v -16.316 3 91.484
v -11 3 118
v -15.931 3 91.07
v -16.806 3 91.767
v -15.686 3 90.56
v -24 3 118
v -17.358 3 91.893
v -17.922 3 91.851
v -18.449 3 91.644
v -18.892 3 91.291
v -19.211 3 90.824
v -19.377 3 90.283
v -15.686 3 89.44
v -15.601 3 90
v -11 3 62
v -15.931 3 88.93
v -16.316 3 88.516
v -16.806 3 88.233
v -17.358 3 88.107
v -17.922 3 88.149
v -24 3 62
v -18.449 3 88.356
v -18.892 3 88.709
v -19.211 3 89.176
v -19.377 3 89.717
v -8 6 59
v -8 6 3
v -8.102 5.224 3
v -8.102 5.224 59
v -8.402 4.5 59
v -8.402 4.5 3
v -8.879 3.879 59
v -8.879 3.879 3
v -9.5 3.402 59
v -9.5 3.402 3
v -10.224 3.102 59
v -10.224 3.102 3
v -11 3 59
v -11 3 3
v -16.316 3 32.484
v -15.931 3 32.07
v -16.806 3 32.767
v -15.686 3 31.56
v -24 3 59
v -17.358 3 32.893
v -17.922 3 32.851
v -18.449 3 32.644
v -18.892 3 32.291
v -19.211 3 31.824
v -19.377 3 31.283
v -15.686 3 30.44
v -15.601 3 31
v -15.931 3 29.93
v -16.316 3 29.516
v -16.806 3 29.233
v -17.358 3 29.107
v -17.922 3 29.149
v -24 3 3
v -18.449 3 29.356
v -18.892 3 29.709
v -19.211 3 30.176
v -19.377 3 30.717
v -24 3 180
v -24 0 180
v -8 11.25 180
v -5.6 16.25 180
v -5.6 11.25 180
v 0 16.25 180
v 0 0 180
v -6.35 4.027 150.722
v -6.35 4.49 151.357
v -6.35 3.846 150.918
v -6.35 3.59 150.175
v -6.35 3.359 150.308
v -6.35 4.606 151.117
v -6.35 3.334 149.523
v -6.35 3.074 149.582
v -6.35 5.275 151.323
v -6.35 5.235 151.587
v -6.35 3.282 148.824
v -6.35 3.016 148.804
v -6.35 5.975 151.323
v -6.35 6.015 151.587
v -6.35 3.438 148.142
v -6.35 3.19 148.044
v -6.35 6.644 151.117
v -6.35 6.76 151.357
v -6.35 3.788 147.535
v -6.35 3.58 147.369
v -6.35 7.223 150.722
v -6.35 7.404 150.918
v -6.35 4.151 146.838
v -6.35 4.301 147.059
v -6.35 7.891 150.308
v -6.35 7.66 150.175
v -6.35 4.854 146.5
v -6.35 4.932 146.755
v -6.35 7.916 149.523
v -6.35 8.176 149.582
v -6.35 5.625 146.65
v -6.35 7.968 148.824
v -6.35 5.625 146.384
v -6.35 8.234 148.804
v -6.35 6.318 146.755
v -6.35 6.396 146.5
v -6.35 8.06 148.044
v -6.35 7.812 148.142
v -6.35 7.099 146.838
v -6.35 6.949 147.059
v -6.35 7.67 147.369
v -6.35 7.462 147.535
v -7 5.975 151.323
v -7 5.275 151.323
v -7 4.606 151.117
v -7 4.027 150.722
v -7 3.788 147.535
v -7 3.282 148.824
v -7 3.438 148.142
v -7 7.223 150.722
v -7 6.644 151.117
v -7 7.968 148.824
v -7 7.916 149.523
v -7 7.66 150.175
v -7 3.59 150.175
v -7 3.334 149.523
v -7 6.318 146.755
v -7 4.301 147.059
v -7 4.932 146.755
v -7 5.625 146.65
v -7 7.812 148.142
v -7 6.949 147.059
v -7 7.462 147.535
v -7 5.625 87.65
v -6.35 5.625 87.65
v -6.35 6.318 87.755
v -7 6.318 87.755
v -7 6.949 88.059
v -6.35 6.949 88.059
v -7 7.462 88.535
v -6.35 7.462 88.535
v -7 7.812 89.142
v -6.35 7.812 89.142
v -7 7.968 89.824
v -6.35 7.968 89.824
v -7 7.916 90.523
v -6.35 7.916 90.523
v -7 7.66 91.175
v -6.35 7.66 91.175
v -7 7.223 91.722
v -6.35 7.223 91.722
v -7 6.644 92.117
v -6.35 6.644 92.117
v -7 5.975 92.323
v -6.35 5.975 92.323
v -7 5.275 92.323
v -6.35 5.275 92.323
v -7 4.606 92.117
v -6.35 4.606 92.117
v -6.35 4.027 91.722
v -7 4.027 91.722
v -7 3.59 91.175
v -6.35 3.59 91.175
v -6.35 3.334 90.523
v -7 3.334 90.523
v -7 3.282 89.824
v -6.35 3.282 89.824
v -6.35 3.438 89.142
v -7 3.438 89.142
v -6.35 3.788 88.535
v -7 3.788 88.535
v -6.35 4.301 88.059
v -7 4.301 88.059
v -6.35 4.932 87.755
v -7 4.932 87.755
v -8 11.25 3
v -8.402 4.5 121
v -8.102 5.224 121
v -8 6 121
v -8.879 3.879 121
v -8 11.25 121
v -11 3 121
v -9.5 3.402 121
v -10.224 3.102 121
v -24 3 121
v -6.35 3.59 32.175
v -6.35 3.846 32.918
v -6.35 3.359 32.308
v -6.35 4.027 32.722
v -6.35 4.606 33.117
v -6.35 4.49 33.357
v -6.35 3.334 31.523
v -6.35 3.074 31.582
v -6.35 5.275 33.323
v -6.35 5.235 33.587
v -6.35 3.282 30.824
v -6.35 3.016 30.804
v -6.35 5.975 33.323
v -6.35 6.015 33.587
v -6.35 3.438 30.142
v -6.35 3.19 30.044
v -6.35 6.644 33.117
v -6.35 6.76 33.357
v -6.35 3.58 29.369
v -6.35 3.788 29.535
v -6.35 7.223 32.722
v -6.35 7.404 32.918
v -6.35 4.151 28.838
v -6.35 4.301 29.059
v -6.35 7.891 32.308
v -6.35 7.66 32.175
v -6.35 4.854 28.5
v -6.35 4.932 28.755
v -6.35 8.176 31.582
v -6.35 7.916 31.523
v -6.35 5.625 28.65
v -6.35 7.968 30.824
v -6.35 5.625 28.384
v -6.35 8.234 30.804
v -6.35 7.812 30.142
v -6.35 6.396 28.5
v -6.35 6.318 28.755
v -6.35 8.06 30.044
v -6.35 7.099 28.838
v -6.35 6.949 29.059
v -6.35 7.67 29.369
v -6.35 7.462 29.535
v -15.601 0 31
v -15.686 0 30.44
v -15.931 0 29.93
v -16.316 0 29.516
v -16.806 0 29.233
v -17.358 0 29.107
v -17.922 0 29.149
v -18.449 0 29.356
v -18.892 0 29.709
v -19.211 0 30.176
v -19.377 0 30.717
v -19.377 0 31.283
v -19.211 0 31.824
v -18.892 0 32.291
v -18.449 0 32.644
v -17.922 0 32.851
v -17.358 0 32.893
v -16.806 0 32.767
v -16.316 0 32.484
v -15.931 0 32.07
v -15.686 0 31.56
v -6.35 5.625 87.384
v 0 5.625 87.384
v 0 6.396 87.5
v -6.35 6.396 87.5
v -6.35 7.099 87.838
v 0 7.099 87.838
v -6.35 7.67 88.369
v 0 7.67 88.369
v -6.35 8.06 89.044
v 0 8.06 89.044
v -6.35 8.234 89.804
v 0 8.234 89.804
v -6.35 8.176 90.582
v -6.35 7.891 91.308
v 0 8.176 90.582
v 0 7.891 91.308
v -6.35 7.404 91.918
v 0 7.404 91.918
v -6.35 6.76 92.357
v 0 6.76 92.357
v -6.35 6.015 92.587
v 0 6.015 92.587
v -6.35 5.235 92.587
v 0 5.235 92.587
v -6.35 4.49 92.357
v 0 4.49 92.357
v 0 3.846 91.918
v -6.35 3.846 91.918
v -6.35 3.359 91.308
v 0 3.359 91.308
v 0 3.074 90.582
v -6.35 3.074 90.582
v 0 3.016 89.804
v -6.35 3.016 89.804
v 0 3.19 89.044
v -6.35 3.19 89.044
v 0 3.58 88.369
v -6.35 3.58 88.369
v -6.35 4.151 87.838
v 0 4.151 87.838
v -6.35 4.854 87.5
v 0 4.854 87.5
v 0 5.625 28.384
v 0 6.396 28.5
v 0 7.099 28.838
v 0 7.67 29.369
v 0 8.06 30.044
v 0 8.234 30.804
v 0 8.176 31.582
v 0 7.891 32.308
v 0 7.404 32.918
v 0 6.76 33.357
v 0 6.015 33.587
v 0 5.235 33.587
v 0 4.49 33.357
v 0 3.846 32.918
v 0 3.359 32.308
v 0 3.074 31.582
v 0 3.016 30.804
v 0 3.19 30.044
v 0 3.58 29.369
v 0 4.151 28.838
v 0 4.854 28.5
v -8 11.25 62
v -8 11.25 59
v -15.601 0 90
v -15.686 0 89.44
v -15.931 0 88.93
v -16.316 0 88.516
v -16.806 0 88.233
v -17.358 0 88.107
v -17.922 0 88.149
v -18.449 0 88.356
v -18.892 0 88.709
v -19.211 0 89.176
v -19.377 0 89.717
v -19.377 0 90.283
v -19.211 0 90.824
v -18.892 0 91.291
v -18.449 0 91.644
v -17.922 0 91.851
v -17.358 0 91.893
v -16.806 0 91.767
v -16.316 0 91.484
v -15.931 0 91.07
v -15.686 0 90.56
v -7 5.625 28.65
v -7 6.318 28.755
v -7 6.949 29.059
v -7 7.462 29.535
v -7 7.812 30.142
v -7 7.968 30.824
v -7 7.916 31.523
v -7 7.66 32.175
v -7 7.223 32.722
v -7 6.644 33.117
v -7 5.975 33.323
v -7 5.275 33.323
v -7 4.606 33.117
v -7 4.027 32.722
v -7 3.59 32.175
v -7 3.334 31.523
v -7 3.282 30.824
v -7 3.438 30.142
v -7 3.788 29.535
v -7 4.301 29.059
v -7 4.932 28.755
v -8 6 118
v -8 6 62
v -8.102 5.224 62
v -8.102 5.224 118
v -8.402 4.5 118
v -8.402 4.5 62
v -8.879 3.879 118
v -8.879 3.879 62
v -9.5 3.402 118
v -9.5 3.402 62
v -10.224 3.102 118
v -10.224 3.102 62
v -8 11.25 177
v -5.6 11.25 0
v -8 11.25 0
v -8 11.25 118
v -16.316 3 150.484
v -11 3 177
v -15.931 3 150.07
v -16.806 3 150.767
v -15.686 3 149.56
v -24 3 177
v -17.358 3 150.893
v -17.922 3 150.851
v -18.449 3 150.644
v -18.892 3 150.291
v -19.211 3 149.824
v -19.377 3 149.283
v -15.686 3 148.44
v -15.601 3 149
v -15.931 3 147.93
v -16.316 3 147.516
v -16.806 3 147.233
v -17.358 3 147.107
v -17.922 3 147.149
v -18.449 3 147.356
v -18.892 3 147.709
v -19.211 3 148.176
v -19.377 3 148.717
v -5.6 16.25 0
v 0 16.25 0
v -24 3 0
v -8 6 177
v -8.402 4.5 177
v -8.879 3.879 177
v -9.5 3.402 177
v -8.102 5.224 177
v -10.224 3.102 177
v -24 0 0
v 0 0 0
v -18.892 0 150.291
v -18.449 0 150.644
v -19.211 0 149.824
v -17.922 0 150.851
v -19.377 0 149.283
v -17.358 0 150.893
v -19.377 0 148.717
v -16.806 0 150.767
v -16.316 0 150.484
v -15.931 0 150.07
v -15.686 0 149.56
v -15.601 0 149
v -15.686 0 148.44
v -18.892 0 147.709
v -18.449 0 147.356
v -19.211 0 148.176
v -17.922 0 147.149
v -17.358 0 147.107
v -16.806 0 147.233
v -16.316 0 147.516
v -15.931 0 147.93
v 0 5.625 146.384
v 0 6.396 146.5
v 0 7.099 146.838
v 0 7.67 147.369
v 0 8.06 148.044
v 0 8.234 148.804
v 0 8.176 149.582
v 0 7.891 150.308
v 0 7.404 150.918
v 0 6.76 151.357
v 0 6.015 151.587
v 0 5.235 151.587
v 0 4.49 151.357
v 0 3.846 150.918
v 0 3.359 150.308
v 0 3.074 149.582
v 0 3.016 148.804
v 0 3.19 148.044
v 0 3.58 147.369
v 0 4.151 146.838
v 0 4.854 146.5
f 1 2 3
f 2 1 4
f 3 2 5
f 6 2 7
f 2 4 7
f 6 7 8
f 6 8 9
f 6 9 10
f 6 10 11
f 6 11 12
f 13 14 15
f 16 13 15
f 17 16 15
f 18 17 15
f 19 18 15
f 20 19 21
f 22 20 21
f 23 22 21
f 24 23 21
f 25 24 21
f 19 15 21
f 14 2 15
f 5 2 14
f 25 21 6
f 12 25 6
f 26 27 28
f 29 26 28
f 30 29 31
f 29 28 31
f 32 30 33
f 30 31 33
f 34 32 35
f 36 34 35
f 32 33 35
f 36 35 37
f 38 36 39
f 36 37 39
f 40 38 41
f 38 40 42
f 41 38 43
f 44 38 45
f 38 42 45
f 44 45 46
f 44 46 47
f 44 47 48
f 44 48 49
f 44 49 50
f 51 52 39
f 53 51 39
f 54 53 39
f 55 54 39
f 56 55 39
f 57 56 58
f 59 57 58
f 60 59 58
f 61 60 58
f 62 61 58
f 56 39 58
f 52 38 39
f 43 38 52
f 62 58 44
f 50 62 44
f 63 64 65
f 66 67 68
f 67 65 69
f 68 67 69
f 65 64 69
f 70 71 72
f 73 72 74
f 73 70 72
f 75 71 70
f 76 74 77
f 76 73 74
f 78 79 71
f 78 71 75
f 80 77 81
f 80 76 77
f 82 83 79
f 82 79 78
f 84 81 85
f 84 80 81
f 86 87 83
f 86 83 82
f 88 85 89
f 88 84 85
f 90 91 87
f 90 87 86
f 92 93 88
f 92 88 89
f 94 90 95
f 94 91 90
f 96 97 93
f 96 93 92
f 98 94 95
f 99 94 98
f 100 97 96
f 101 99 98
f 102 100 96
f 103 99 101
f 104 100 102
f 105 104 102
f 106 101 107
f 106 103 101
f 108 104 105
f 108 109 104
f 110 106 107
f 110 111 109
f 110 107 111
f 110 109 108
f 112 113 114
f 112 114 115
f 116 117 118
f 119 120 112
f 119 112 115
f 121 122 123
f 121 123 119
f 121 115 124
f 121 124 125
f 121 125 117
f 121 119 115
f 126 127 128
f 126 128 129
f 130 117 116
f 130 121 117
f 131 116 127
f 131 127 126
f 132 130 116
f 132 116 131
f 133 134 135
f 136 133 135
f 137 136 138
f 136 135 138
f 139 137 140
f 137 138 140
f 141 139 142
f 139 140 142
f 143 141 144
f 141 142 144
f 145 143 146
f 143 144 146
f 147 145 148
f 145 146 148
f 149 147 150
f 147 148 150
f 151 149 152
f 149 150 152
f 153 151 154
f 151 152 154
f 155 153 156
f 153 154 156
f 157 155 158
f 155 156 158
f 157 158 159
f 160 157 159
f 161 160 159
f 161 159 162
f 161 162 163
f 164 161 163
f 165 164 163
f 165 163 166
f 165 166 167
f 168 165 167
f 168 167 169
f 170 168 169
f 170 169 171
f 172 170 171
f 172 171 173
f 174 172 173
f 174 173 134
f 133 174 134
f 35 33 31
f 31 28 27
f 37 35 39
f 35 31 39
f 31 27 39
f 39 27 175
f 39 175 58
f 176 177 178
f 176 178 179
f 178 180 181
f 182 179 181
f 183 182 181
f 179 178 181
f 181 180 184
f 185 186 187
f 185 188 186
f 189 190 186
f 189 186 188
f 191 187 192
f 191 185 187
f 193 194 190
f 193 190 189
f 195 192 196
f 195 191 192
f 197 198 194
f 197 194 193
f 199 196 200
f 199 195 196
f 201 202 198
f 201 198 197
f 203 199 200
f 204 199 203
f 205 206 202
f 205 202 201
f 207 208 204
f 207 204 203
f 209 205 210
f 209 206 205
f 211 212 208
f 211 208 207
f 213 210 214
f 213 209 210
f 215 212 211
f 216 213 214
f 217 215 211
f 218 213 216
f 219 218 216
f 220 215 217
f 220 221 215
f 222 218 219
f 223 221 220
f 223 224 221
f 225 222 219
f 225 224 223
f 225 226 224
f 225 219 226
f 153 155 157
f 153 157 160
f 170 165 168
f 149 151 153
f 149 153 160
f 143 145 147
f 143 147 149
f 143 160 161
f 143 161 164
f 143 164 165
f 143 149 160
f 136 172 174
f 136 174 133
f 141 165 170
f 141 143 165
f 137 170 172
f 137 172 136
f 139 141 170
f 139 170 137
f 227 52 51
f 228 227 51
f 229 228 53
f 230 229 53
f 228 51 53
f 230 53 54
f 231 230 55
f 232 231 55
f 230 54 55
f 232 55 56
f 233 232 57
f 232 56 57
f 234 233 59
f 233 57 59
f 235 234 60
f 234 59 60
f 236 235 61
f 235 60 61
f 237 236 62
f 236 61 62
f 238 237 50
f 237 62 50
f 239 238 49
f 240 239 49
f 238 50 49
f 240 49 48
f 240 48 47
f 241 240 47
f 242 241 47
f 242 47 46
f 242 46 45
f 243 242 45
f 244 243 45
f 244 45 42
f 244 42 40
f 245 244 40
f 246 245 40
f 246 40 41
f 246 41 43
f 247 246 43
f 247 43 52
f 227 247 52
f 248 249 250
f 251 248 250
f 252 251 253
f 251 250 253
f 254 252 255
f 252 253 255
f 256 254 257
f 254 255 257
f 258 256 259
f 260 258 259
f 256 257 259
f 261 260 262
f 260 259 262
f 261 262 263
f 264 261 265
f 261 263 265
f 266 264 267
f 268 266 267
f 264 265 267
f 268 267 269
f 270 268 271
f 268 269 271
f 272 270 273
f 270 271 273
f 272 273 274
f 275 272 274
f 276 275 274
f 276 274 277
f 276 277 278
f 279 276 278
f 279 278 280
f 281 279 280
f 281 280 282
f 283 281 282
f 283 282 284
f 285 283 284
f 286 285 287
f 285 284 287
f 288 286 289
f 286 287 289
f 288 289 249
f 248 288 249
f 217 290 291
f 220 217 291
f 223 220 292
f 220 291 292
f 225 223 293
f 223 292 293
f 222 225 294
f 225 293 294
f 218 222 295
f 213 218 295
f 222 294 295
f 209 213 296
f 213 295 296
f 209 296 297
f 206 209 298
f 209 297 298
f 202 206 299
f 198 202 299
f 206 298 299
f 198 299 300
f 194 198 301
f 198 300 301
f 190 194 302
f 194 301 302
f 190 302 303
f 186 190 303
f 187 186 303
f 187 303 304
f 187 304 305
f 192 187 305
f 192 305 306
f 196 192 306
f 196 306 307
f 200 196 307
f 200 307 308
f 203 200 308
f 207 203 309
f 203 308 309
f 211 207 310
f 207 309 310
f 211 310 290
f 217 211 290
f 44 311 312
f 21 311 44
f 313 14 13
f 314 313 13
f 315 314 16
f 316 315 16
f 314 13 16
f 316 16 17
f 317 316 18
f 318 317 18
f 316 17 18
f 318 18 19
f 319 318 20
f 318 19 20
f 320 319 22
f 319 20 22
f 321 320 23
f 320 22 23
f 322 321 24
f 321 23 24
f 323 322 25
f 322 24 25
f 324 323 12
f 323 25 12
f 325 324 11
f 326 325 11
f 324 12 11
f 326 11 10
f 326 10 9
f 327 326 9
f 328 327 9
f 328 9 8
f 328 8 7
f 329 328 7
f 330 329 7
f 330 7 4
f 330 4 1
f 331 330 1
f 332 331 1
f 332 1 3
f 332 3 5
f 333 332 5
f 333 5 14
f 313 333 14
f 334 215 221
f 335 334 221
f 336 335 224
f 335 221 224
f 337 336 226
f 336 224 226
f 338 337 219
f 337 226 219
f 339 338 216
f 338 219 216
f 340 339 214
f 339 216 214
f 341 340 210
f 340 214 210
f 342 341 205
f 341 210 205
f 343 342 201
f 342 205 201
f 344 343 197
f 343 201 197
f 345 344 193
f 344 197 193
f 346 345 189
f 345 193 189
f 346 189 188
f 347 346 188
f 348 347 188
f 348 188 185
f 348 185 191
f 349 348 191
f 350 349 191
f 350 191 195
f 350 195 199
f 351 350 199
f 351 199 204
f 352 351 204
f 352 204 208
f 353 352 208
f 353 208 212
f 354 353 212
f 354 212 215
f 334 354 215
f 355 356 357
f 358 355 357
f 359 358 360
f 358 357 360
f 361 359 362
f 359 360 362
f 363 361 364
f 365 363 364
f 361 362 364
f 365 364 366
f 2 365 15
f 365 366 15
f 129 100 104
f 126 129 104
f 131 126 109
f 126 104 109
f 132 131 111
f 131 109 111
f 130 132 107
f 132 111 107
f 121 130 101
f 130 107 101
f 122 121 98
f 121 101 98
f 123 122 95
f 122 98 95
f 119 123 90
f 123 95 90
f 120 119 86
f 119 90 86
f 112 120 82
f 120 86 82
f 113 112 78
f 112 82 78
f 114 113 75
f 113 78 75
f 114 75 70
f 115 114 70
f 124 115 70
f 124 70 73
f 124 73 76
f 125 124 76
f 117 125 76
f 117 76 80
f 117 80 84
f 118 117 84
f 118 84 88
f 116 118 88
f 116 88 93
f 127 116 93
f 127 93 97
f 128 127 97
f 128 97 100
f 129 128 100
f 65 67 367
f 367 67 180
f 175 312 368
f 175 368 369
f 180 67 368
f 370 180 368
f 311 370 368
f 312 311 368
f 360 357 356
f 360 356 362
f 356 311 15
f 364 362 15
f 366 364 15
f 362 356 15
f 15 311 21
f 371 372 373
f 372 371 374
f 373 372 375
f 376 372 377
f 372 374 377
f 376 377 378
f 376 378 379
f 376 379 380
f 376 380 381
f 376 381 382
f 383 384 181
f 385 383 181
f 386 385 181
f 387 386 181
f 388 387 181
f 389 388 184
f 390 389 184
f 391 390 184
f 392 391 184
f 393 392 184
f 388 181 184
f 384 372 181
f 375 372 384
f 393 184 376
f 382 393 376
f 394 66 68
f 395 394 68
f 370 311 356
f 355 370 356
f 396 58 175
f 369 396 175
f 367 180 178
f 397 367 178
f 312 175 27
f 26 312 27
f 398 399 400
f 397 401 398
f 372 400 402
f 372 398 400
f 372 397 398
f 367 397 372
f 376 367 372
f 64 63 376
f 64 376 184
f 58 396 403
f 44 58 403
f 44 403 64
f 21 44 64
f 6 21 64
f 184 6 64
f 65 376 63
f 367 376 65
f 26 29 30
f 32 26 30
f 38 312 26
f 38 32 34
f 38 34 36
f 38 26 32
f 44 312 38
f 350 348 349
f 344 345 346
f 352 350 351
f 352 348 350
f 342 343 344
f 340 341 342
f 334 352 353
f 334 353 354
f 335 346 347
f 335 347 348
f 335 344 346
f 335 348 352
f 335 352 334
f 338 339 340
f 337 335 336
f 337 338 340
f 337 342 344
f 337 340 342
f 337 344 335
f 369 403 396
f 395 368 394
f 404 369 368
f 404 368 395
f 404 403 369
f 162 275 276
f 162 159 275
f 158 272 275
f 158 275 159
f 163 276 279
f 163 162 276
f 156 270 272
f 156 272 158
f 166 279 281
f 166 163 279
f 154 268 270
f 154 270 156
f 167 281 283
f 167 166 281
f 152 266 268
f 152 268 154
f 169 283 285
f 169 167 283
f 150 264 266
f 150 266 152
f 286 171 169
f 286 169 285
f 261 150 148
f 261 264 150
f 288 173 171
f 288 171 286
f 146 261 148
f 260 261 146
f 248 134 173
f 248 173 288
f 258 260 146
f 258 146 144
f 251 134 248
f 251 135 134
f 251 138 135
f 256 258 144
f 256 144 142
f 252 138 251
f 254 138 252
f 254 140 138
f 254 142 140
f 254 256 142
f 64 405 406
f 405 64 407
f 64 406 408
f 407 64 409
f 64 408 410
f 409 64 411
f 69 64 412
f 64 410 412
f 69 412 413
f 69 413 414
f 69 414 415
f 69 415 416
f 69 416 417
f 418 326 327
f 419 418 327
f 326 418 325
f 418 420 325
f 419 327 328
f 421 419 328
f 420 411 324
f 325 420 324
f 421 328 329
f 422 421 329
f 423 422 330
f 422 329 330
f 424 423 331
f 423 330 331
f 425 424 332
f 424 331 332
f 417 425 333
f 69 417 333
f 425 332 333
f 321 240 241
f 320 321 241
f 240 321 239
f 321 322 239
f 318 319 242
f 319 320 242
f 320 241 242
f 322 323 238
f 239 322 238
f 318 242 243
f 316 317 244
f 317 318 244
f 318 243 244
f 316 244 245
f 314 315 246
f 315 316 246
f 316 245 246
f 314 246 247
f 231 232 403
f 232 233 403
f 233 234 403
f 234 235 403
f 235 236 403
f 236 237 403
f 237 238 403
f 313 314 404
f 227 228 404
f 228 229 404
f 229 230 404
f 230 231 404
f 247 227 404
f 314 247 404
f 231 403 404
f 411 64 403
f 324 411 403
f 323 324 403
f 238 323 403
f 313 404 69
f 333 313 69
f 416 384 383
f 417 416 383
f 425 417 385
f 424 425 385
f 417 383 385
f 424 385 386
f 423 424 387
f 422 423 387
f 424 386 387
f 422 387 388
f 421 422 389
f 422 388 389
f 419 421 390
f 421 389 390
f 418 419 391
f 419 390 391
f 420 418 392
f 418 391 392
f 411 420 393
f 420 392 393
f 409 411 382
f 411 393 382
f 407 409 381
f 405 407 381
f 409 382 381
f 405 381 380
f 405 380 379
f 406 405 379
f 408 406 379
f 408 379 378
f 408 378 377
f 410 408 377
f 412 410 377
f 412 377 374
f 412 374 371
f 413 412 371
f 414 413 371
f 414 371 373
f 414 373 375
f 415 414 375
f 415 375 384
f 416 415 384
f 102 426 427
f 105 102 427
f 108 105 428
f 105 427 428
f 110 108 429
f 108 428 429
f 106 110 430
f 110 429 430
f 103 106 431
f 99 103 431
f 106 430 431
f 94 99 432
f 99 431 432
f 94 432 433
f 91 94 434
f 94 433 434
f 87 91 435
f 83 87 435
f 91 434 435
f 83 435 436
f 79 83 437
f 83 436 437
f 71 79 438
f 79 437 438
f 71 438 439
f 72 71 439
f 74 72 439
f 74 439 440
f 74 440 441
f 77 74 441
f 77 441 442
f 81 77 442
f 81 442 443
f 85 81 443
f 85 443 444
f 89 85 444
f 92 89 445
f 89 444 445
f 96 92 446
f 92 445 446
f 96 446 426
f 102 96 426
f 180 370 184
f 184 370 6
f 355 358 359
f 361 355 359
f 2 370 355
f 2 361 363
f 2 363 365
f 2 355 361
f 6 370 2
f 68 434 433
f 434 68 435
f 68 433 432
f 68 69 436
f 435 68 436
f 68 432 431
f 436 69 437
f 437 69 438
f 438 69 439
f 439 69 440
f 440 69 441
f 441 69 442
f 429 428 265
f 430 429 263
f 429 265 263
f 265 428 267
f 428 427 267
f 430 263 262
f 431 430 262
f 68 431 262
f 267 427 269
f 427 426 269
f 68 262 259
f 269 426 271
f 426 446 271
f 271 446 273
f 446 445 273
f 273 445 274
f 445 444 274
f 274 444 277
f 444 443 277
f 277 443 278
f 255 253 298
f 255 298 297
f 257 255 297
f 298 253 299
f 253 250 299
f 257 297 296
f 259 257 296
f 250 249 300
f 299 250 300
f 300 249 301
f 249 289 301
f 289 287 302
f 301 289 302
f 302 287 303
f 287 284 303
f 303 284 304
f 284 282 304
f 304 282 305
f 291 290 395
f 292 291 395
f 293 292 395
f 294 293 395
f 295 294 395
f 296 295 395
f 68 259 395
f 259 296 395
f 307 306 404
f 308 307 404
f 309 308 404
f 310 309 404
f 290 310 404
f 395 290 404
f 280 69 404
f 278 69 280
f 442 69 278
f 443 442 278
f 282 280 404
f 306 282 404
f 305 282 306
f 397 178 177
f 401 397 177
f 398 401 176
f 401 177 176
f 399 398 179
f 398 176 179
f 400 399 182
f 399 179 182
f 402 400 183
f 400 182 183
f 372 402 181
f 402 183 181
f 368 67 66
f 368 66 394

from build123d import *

# Parameters (mm, degrees)
BOSS_EXTRUDE1_DEPTH   = 180
RIB3_REACH            = 124.404
SKETCH4_WALL_W        = 264.810334732
SKETCH4_WALL_H        = 3
RIB4_START            = -3
RIB4_DEPTH            = 3
F_6_CLEARANCE_HOLE1_D = 3.7973
SKETCH6_R             = 2.3495
CUT_EXTRUDE1_DEPTH    = 7
SKETCH12_R            = 2.6162
CUT_EXTRUDE2_DEPTH    = 6.35
SKETCH13_W            = 5.6
SKETCH13_H            = 180
BOSS_EXTRUDE2_DEPTH   = 5


# Read off the part's stored shape, not the designer's step: Rib4
with BuildPart() as part:
    # Sketch1 → Boss-Extrude1 (new body)
    with BuildSketch(Plane.XY):
        with BuildLine():
            Line((0, 0), (0, 11.25))
            Line((0, 11.25), (-8, 11.25))
            Line((-8, 11.25), (-8, 6))
            ThreePointArc((-8, 6), (-8.878679656, 3.878679656), (-11, 3))
            Line((-11, 3), (-24, 3))
            Line((-24, 3), (-24, 0))
            Line((-24, 0), (0, 0))
        make_face()
    extrude(amount=BOSS_EXTRUDE1_DEPTH)

    # Sketch4 wall → Rib3 (add, up to next)
    with BuildSketch(Plane(origin=(-16, 7.125, 60.5), x_dir=(-0.888803167408, -0.458289133195, 0), z_dir=(-0.458289133195, 0.888803167408, 0)), mode=Mode.PRIVATE) as rib3_sk1:
        Rectangle(SKETCH4_WALL_W, SKETCH4_WALL_H)
    rib3_tool1 = extrude(rib3_sk1.sketch, amount=-RIB3_REACH, mode=Mode.PRIVATE) - part.part
    rib3 = rib3_tool1.solids().sort_by_distance((-16, 7.125, 60.5))[0]
    add(rib3)

    # Rib4 outline → Rib4 (add)
    with BuildSketch(Plane(origin=(0, 0, 0), x_dir=(-1, 0, 0), z_dir=(0, 0, -1)).offset(RIB4_START)):
        with BuildLine():
            Line((24, 3), (8, 11.25))
            Line((8, 11.25), (8, 6))
            ThreePointArc((8, 6), (8.878679656, 3.878679656), (11, 3))
            Line((11, 3), (24, 3))
        make_face()
    rib4 = extrude(amount=RIB4_DEPTH)

    # Mirror1: Rib3, Rib4 across plane
    add(rib3.mirror(Plane(origin=(0, 0, 90), x_dir=(1, 0, 0), z_dir=(0, 0, -1))))
    add(rib4.mirror(Plane(origin=(0, 0, 90), x_dir=(1, 0, 0), z_dir=(0, 0, -1))))

    # #6 Clearance Hole1 (through all)
    with Locations(Plane(origin=(0, 0, 0), x_dir=(-1, 0, 0), z_dir=(0, -1, 0))):
        with Locations((17.5, -31), (17.5, -149), (17.5, -90)):
            Hole(F_6_CLEARANCE_HOLE1_D / 2)

    # Sketch6 → Cut-Extrude1 (cut)
    with BuildSketch(Plane(origin=(0, 0, 0), x_dir=(0, 0, -1), z_dir=(1, 0, 0))):
        with Locations((-149, 5.625)):
            Circle(SKETCH6_R)
        with Locations((-31, 5.625)):
            Circle(SKETCH6_R)
        with Locations((-90, 5.625)):
            Circle(SKETCH6_R)
    extrude(amount=-CUT_EXTRUDE1_DEPTH, mode=Mode.SUBTRACT)

    # Sketch12 → Cut-Extrude2 (cut)
    with BuildSketch(Plane(origin=(0, 0, 0), x_dir=(0, 0, -1), z_dir=(1, 0, 0))):
        with Locations((-149, 5.625)):
            Circle(SKETCH12_R)
        with Locations((-31, 5.625)):
            Circle(SKETCH12_R)
        with Locations((-90, 5.625)):
            Circle(SKETCH12_R)
    extrude(amount=-CUT_EXTRUDE2_DEPTH, mode=Mode.SUBTRACT)

    # Sketch13 → Boss-Extrude2 (add)
    with BuildSketch(Plane(origin=(0, 11.25, 0), x_dir=(1, 0, 0), z_dir=(0, 1, 0))):
        with Locations((-2.8, -90)):
            Rectangle(SKETCH13_W, SKETCH13_H)
    extrude(amount=BOSS_EXTRUDE2_DEPTH)


solid = part.part
